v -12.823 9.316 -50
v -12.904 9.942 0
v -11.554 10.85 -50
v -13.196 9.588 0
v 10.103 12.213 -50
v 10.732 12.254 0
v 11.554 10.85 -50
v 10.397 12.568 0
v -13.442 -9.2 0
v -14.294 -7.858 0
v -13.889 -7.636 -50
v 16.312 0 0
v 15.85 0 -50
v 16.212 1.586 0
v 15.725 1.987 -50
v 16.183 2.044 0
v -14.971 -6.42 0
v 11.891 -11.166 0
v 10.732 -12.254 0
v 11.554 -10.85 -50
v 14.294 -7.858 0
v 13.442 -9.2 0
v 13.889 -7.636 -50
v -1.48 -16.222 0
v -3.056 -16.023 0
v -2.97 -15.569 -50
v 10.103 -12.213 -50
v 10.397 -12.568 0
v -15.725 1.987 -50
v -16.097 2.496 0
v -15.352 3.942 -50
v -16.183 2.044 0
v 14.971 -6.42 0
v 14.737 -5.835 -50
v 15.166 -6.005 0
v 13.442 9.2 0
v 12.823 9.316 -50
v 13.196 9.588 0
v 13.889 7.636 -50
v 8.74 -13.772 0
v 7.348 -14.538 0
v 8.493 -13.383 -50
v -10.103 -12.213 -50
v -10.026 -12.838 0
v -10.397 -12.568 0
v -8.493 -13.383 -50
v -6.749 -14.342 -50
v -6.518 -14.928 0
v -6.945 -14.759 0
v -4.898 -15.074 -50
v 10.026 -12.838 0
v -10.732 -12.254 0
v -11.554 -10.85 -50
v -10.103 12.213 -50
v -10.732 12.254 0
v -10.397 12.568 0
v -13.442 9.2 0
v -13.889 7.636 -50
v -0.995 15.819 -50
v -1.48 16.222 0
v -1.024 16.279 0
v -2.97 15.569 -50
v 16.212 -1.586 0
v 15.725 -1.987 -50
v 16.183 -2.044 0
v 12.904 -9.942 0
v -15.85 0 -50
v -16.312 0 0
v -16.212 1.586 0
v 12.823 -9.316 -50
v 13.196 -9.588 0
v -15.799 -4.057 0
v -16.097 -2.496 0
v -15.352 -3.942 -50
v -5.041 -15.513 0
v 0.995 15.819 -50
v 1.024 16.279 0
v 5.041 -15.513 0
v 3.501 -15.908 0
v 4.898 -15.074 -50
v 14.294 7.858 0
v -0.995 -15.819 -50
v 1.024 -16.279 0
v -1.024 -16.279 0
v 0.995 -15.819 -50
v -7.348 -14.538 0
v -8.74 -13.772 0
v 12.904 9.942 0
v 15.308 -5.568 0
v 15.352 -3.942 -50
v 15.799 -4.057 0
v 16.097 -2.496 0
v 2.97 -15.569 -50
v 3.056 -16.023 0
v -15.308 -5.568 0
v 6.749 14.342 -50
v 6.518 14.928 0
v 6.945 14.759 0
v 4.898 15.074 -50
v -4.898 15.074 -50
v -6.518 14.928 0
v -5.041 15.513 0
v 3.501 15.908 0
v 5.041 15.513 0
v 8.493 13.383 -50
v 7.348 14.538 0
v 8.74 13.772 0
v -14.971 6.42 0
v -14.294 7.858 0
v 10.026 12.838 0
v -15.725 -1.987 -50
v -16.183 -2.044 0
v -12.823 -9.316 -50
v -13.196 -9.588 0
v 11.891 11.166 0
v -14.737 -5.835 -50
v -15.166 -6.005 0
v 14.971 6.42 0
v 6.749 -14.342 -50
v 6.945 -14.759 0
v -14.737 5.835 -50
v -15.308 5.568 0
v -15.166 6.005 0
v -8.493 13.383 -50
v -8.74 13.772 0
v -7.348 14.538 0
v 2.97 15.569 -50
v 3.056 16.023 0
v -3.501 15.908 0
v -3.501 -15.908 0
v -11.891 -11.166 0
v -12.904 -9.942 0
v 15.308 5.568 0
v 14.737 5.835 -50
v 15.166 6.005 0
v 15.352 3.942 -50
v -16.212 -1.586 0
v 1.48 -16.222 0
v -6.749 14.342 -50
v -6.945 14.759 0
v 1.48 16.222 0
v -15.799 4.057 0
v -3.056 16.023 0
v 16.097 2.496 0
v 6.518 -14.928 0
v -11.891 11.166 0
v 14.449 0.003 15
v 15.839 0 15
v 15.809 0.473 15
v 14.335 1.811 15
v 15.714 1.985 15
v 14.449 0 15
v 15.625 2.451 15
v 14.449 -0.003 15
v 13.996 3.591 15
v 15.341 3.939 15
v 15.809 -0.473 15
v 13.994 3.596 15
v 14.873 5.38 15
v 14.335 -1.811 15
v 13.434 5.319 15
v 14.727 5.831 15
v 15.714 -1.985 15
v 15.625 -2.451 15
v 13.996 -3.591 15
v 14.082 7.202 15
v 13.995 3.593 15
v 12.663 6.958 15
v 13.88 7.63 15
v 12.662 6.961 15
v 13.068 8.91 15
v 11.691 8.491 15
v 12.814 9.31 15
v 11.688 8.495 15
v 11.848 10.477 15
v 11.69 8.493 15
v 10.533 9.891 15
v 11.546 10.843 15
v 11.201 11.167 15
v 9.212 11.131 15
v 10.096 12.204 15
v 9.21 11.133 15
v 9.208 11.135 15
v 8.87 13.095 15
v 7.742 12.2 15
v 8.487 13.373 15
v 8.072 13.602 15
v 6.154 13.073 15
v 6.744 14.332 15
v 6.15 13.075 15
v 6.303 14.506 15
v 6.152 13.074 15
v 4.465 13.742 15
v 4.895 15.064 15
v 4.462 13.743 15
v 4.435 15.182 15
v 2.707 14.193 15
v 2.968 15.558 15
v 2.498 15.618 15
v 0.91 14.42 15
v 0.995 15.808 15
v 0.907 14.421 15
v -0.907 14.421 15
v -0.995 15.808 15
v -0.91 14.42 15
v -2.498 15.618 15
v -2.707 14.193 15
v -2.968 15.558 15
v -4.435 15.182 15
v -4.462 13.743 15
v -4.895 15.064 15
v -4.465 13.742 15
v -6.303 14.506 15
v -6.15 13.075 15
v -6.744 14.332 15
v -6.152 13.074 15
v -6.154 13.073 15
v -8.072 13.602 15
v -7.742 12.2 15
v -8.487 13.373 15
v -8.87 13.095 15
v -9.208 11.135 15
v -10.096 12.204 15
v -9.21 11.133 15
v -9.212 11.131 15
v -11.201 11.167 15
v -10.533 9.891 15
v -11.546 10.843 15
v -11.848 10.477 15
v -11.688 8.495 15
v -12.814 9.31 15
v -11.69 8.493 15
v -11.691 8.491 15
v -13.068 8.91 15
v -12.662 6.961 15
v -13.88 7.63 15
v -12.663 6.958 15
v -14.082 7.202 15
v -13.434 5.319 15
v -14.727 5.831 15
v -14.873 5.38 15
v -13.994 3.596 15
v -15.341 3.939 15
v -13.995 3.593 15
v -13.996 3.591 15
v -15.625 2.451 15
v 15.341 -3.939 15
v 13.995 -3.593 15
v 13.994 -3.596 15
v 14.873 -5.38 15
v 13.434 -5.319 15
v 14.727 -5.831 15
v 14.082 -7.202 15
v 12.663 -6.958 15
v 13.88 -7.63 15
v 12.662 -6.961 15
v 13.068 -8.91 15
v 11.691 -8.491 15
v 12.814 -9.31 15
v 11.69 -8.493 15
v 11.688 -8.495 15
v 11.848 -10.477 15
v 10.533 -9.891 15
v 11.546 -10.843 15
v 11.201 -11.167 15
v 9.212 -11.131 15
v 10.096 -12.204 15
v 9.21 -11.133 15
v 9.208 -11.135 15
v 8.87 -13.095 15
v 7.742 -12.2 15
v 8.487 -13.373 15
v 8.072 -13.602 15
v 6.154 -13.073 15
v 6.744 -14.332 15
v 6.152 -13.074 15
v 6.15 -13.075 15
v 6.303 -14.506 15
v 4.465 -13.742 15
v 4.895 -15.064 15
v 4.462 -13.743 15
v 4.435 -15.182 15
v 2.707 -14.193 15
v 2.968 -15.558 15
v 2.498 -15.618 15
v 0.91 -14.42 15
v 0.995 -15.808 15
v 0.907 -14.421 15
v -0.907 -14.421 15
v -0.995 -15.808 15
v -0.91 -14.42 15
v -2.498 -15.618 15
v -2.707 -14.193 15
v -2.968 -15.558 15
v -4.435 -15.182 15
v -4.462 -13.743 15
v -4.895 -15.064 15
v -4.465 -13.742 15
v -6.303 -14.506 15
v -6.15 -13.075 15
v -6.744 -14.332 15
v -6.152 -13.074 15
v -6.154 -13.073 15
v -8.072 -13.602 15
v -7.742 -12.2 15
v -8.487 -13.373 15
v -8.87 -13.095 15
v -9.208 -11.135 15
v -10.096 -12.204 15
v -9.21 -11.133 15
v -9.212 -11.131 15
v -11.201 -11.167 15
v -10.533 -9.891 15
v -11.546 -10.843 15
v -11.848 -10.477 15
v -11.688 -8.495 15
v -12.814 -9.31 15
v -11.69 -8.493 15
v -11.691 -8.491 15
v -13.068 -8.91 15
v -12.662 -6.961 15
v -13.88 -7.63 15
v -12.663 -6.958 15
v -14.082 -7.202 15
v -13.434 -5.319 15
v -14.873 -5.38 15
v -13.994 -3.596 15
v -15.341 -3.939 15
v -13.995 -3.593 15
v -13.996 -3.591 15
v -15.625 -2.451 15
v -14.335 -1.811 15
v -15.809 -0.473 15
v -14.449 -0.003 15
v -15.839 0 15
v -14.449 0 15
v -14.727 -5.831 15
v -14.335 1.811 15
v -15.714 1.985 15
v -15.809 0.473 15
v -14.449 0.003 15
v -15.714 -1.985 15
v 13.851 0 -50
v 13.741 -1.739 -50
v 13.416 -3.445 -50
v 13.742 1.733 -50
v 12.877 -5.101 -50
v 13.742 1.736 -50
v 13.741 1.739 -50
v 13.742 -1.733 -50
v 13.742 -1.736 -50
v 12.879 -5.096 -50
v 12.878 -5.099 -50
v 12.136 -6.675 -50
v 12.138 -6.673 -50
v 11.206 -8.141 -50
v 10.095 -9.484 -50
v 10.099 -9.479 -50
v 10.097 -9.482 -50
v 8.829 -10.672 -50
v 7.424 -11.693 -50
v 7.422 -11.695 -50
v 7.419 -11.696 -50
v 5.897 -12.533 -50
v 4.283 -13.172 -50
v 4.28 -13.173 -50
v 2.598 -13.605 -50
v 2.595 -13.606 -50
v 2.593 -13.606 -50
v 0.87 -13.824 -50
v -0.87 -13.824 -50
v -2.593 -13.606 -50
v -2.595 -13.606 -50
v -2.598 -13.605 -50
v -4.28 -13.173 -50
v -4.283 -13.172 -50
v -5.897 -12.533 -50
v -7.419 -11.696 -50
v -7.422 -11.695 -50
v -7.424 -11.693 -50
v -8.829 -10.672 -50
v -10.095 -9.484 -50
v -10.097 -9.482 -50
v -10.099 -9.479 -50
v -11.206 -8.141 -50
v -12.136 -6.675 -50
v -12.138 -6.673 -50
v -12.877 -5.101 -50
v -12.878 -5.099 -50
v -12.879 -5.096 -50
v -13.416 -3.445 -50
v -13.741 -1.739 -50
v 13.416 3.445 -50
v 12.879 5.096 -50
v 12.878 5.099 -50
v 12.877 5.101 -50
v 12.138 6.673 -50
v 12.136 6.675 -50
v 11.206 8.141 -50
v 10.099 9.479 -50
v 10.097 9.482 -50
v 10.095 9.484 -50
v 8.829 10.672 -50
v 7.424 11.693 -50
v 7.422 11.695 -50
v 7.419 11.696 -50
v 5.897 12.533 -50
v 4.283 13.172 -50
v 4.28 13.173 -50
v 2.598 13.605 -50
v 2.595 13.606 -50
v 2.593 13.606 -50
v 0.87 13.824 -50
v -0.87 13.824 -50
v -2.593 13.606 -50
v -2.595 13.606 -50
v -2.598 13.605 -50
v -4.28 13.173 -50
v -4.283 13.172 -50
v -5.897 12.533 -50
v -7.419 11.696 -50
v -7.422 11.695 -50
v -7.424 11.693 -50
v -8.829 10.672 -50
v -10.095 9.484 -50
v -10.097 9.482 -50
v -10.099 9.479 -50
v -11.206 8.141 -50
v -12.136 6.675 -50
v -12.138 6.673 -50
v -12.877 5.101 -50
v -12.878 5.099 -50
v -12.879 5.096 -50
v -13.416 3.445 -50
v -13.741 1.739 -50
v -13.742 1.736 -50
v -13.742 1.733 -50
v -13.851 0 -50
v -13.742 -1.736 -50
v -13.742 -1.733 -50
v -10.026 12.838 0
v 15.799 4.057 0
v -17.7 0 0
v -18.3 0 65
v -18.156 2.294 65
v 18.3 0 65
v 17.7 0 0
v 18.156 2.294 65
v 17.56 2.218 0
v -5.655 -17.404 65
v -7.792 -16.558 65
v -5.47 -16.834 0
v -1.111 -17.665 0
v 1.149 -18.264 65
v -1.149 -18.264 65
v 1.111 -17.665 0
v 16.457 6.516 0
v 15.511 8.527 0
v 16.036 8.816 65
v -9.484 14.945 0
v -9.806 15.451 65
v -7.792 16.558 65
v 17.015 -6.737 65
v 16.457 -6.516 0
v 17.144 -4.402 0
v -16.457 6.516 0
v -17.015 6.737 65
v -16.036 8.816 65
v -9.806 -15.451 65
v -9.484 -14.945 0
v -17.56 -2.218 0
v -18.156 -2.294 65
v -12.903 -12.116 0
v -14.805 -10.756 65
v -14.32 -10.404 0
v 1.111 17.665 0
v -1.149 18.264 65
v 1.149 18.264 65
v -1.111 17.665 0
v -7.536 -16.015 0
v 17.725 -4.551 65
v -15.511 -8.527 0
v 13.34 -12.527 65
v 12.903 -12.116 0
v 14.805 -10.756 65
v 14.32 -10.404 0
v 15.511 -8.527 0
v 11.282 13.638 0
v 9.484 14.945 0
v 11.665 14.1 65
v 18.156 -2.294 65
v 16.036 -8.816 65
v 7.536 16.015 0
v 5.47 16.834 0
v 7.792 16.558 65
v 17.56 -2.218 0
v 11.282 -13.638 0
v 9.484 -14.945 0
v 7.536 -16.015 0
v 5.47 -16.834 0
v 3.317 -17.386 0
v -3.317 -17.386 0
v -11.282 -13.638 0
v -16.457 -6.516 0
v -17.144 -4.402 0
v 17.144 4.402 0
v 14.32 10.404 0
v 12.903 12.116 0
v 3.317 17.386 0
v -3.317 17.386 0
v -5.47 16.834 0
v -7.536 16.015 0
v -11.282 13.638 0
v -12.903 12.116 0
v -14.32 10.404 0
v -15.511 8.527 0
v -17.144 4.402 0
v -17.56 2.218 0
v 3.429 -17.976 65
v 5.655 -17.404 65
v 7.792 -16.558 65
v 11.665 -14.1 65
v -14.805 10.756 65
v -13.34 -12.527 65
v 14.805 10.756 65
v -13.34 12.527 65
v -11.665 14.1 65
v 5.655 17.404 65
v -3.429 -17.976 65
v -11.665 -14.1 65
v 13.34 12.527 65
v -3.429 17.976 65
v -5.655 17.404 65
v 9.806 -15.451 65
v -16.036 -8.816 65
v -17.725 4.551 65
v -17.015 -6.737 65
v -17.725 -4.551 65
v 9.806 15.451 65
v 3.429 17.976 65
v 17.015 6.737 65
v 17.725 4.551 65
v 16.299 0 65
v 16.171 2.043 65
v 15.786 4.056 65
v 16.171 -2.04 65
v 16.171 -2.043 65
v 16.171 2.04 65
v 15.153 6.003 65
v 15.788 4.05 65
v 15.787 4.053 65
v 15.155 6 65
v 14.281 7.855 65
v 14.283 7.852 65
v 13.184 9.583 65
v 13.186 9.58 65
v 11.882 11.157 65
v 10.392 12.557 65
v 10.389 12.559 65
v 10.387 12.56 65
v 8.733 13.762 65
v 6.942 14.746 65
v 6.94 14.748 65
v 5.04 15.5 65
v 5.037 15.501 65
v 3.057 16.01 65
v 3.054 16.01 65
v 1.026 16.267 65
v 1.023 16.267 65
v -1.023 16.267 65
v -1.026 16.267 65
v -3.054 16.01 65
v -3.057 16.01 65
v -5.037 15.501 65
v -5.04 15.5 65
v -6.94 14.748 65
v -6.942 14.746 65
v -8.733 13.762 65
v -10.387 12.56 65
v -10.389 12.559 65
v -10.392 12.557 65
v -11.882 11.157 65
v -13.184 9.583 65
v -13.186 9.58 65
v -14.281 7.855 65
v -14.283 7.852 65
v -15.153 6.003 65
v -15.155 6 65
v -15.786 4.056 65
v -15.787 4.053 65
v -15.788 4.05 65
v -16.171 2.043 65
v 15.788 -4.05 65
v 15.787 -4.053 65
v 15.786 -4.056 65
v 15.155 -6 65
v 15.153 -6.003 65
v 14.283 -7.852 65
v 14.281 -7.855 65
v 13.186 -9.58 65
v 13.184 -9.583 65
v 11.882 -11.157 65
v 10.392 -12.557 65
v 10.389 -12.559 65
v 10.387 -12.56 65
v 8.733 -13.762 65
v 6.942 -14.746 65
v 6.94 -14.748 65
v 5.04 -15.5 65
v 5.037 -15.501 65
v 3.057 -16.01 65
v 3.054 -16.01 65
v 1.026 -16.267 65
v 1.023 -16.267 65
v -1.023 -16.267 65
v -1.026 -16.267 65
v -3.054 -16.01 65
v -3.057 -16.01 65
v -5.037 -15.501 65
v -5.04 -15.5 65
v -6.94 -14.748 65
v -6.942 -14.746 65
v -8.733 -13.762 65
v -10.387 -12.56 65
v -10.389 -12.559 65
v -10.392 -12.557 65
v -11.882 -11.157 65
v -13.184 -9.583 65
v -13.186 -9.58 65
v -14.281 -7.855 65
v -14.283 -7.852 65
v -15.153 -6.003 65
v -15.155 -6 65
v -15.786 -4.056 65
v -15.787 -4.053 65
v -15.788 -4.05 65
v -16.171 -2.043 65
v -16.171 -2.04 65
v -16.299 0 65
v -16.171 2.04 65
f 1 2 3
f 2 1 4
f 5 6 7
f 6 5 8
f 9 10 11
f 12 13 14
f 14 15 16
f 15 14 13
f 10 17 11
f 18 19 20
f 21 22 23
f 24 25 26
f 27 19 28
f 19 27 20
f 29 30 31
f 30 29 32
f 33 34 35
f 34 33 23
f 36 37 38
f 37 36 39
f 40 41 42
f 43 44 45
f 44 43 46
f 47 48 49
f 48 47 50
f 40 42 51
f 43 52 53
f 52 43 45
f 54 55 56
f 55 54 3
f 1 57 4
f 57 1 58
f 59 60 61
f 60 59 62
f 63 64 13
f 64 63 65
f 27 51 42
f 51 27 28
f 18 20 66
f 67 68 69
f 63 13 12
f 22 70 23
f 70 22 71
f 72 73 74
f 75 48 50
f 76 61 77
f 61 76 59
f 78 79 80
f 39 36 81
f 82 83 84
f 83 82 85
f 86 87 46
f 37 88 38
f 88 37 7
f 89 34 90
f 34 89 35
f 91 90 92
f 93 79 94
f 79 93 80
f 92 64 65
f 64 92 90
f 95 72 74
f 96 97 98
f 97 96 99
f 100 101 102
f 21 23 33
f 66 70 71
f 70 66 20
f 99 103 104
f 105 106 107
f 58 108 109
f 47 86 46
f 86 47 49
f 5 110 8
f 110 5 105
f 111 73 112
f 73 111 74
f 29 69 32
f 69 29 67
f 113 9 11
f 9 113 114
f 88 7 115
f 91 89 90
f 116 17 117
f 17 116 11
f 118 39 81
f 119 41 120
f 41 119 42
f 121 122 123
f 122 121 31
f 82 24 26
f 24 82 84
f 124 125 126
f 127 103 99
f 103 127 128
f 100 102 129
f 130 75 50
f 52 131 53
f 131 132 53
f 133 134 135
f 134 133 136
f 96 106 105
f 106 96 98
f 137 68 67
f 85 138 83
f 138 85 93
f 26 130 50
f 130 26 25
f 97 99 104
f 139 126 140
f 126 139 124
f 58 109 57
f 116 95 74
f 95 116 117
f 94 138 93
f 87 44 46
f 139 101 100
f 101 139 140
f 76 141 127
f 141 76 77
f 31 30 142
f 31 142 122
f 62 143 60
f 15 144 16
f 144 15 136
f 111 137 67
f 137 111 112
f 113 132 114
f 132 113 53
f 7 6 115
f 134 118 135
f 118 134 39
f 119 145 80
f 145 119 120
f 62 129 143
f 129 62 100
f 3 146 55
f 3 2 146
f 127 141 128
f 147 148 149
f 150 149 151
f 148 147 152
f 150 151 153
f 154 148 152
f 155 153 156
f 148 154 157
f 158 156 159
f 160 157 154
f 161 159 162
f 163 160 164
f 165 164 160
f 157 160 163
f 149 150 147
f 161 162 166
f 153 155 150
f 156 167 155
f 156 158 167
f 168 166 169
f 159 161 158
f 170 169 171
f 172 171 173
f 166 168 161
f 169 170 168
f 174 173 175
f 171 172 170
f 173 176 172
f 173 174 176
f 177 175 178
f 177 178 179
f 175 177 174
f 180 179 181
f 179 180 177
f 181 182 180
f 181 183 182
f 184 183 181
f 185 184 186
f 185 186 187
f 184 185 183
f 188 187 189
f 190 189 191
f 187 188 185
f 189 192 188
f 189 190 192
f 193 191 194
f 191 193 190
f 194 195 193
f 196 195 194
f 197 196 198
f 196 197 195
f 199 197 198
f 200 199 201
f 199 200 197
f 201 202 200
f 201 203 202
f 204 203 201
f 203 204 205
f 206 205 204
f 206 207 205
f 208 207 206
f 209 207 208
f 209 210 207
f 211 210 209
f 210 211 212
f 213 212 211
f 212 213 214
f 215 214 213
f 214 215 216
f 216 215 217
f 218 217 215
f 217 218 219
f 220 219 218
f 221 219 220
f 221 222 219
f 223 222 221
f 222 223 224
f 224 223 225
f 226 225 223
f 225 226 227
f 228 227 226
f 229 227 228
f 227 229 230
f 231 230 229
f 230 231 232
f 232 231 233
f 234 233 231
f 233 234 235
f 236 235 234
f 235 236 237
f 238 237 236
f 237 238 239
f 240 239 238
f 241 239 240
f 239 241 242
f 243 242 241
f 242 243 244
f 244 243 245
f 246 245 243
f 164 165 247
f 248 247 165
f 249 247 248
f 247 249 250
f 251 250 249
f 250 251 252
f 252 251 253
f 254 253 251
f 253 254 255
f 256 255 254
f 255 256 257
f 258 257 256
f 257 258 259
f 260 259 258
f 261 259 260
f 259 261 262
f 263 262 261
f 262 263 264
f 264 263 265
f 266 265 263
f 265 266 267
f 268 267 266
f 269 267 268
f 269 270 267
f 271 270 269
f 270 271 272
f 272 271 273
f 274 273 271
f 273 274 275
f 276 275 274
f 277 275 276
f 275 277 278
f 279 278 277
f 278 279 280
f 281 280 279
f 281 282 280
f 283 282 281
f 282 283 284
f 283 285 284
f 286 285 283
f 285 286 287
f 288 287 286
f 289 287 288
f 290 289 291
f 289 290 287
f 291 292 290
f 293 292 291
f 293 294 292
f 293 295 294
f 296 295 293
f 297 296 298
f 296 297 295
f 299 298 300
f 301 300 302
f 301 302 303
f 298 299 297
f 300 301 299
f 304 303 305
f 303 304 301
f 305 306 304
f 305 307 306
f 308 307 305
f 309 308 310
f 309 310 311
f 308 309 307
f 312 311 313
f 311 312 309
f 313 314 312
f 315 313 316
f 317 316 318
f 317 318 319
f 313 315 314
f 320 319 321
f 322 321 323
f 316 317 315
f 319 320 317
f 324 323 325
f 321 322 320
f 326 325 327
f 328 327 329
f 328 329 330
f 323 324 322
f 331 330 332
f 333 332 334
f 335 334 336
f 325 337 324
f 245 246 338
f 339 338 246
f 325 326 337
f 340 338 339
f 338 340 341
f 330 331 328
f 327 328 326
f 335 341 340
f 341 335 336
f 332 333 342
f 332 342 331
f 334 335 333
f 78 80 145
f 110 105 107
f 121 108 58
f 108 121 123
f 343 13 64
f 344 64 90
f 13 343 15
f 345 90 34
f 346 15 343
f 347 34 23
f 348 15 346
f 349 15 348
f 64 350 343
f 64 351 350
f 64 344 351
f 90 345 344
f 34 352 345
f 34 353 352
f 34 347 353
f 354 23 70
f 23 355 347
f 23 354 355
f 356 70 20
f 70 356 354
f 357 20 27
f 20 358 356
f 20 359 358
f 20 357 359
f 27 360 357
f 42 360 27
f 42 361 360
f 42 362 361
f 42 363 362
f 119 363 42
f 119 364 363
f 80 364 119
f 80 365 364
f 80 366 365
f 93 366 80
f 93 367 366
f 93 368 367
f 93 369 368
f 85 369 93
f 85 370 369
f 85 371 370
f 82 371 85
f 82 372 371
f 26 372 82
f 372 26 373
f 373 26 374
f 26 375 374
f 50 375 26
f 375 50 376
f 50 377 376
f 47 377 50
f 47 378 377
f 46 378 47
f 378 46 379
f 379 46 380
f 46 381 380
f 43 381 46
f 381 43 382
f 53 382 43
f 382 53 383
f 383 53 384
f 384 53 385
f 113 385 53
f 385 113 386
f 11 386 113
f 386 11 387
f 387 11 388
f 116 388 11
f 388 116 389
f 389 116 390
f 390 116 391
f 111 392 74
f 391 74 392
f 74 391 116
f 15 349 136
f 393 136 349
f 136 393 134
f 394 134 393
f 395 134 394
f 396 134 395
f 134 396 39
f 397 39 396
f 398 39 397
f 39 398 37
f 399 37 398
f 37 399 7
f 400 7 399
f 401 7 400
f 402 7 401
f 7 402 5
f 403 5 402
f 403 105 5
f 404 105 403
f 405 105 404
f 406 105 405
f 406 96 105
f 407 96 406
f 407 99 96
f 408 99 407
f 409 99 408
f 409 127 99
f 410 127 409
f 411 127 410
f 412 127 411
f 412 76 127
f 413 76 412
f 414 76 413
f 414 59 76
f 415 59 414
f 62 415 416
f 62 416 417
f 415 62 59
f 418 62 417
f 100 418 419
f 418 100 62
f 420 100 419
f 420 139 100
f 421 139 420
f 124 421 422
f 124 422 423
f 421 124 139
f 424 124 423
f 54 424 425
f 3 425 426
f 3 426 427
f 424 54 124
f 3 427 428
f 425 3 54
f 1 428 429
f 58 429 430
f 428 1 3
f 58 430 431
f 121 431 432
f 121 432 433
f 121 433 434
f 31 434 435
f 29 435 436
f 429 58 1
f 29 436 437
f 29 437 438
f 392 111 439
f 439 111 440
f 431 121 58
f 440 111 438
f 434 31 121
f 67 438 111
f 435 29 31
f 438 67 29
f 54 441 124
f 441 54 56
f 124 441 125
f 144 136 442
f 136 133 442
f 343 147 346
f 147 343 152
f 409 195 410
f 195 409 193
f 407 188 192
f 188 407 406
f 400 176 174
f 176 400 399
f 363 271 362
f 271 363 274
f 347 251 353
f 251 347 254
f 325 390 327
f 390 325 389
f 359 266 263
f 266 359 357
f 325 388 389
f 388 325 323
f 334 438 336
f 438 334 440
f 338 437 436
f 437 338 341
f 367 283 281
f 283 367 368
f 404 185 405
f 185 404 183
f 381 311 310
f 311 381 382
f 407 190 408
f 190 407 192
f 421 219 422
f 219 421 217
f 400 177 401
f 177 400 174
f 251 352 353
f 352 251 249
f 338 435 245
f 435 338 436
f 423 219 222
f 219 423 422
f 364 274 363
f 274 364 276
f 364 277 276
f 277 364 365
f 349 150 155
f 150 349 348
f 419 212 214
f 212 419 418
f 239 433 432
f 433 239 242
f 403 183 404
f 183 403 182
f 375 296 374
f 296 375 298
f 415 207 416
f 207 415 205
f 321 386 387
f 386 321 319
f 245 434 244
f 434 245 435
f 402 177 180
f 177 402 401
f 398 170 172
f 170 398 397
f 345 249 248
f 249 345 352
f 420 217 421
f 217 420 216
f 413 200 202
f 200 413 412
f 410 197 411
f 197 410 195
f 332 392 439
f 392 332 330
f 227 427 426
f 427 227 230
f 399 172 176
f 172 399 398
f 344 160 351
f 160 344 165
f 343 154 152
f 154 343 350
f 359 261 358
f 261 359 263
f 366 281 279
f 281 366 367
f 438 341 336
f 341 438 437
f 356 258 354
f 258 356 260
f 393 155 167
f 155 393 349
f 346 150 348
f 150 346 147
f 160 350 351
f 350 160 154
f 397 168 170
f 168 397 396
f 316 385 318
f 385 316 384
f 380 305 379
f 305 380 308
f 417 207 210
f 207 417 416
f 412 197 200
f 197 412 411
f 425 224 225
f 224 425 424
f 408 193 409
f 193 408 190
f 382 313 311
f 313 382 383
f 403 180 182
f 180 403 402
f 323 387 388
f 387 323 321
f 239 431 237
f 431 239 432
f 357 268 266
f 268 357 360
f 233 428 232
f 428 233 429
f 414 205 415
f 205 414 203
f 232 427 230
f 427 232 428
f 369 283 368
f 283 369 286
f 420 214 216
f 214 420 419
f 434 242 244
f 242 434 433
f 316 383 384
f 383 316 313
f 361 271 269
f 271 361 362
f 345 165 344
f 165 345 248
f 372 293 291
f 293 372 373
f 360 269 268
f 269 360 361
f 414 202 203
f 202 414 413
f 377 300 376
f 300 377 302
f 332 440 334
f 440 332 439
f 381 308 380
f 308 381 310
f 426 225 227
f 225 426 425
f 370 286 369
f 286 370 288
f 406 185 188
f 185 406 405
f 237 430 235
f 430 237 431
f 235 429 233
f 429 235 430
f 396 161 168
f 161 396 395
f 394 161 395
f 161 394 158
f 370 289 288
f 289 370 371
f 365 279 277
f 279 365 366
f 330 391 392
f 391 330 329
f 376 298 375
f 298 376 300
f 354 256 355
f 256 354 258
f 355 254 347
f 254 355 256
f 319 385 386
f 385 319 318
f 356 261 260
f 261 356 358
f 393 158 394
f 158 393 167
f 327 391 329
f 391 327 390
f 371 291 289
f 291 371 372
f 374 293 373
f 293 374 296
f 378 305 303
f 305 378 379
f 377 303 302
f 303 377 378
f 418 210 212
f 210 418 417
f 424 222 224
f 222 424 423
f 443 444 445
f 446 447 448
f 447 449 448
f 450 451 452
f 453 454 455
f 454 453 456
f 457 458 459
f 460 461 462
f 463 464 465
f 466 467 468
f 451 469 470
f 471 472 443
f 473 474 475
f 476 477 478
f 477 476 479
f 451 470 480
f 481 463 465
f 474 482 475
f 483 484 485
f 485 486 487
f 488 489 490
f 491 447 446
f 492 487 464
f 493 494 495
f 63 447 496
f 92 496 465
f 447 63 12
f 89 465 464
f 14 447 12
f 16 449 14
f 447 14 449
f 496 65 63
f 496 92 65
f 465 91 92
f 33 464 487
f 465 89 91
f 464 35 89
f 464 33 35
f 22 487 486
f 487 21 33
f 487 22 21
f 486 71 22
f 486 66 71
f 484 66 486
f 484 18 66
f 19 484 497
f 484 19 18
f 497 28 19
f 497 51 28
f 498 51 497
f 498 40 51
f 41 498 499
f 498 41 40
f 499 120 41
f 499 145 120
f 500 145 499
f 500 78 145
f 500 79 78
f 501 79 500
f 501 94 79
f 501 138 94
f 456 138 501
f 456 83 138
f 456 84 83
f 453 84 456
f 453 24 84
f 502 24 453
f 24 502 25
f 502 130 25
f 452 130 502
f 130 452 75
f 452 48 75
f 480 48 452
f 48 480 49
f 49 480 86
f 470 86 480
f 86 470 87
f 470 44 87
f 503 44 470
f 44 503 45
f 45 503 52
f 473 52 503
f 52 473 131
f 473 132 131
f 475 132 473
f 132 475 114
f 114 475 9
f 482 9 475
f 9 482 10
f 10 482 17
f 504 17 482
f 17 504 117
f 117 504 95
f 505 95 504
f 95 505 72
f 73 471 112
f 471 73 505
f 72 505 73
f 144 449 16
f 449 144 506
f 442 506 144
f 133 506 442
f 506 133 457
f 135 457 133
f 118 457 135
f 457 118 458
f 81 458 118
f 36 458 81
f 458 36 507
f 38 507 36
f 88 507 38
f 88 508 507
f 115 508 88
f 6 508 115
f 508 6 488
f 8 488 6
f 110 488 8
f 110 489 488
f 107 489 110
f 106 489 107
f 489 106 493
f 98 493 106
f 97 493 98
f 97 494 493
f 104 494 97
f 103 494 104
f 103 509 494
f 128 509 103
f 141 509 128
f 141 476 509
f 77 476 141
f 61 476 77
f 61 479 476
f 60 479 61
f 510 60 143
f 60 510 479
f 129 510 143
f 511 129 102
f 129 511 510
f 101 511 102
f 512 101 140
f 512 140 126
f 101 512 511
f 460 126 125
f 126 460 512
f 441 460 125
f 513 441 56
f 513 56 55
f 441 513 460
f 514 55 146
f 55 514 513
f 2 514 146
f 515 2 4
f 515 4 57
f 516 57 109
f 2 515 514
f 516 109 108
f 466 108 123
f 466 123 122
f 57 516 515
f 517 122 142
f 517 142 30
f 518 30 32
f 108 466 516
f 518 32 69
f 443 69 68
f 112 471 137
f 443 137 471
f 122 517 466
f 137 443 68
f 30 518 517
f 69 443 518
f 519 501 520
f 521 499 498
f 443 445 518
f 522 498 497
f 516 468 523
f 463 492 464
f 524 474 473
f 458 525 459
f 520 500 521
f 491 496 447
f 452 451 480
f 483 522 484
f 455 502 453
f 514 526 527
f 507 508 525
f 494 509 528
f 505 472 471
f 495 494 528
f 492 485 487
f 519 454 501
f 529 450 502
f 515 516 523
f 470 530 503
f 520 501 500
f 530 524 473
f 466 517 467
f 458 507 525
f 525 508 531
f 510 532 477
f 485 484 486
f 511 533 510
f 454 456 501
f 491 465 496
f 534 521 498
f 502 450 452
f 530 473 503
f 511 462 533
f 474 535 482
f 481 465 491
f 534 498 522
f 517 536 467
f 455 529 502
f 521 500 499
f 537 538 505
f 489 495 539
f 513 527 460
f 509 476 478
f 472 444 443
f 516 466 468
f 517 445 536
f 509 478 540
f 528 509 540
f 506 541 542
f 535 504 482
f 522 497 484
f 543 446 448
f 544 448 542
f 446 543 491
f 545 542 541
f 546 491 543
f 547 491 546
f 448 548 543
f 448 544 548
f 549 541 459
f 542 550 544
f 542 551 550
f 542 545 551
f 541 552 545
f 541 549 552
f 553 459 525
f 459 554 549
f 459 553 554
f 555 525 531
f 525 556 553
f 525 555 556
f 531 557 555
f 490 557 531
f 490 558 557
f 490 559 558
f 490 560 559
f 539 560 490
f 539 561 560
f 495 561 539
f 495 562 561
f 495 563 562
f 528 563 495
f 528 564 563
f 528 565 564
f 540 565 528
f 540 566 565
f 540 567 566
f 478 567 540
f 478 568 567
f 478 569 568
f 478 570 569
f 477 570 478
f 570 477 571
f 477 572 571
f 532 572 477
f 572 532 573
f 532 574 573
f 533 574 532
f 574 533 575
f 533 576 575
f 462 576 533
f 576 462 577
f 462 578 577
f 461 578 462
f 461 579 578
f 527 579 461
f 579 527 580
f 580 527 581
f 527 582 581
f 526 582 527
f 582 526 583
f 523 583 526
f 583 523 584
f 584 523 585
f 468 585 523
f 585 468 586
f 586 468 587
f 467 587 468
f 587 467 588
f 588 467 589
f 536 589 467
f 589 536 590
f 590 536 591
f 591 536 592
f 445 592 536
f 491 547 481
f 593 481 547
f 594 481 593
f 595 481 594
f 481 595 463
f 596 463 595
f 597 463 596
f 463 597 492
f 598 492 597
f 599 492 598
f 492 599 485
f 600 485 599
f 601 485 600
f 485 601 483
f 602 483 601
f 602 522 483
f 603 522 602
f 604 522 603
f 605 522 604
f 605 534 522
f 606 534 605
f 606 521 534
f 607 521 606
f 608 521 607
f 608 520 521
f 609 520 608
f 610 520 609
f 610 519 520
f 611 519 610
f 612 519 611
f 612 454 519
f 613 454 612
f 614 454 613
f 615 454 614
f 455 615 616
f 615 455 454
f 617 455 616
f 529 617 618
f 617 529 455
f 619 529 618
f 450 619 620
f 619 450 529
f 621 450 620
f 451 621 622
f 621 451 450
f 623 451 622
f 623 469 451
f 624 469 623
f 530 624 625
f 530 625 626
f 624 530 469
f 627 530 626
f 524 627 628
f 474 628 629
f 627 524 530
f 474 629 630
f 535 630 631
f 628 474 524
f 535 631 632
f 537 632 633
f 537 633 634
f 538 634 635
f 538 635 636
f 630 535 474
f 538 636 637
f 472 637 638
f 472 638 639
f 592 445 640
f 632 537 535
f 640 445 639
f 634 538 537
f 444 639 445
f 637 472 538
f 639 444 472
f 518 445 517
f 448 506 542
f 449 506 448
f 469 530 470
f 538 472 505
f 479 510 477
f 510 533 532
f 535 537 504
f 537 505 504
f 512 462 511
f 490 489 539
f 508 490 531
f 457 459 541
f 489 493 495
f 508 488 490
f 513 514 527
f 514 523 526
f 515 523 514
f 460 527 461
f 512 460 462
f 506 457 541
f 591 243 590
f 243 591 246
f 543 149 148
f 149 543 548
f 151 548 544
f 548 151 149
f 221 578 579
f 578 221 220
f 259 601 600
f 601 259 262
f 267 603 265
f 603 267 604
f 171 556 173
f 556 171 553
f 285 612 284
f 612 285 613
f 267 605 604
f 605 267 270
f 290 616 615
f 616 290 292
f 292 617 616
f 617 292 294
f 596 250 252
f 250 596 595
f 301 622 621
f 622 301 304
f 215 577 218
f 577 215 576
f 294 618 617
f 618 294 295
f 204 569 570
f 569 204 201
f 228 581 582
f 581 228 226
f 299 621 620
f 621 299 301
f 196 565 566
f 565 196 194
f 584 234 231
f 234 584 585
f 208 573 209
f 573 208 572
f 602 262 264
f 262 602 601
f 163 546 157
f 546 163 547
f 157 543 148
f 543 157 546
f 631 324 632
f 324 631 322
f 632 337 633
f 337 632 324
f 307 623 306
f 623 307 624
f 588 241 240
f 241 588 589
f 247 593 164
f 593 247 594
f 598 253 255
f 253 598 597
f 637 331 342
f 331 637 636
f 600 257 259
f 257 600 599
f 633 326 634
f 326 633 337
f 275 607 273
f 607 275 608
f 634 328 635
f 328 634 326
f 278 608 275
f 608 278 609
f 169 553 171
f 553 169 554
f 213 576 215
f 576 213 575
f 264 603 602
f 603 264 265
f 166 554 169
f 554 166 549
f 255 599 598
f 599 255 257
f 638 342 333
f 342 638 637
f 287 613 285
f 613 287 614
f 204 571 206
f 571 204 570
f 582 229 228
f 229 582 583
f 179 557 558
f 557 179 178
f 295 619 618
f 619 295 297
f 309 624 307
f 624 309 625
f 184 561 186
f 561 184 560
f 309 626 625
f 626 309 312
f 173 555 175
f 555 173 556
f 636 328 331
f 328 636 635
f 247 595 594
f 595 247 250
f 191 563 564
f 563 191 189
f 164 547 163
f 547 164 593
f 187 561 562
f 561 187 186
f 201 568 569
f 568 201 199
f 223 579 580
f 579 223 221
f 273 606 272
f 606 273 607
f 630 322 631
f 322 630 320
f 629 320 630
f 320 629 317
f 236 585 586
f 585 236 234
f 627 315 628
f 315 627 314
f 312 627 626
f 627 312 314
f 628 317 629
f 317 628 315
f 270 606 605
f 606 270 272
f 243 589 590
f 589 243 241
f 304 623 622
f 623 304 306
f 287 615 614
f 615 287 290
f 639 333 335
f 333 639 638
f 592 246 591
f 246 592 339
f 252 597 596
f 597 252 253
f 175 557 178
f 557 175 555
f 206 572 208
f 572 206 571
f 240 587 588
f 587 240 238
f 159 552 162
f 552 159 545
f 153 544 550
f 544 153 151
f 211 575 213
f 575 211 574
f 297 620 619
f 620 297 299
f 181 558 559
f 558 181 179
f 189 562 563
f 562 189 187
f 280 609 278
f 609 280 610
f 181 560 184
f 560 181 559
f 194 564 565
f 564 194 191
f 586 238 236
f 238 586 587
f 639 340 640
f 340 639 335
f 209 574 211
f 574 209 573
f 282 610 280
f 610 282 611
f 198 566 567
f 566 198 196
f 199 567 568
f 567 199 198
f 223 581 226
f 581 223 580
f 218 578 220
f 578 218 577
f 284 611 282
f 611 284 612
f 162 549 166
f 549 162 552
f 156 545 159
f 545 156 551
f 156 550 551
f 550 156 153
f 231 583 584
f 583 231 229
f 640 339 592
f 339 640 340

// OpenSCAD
// Extend vaacum

inner_radius = 32.3 / 2.0;
inner_length = 50.0;
outer_radius = 32.0 / 2.0;
outer_length = 50.0;

fudge = 0.3;

thickness = 2.0;
overlap = 15.0;

pad = 0.1;

$fn = 50;

// Stuff that goes inner
module inner() {
    translate([0,0,-inner_length]) {
        difference () {
            cylinder( h = inner_length + overlap, r1 = inner_radius - fudge, r2 = inner_radius + fudge);
            translate( [0,0,-pad] ) {
                cylinder( h = inner_length + overlap + 2 * pad, r1 = inner_radius - fudge - thickness, r2 = inner_radius + fudge - thickness );
            }
        }
    }
}

module outer() {
    difference () {
        cylinder( h = outer_length + overlap, r1 = outer_radius + thickness - fudge, r2 = outer_radius + thickness + fudge);
        translate( [0,0,-pad] ) {
            cylinder( h = outer_length + overlap + 2 * pad, r1 = outer_radius - fudge, r2 = outer_radius + fudge);
        }
    }
}

inner();
outer();
